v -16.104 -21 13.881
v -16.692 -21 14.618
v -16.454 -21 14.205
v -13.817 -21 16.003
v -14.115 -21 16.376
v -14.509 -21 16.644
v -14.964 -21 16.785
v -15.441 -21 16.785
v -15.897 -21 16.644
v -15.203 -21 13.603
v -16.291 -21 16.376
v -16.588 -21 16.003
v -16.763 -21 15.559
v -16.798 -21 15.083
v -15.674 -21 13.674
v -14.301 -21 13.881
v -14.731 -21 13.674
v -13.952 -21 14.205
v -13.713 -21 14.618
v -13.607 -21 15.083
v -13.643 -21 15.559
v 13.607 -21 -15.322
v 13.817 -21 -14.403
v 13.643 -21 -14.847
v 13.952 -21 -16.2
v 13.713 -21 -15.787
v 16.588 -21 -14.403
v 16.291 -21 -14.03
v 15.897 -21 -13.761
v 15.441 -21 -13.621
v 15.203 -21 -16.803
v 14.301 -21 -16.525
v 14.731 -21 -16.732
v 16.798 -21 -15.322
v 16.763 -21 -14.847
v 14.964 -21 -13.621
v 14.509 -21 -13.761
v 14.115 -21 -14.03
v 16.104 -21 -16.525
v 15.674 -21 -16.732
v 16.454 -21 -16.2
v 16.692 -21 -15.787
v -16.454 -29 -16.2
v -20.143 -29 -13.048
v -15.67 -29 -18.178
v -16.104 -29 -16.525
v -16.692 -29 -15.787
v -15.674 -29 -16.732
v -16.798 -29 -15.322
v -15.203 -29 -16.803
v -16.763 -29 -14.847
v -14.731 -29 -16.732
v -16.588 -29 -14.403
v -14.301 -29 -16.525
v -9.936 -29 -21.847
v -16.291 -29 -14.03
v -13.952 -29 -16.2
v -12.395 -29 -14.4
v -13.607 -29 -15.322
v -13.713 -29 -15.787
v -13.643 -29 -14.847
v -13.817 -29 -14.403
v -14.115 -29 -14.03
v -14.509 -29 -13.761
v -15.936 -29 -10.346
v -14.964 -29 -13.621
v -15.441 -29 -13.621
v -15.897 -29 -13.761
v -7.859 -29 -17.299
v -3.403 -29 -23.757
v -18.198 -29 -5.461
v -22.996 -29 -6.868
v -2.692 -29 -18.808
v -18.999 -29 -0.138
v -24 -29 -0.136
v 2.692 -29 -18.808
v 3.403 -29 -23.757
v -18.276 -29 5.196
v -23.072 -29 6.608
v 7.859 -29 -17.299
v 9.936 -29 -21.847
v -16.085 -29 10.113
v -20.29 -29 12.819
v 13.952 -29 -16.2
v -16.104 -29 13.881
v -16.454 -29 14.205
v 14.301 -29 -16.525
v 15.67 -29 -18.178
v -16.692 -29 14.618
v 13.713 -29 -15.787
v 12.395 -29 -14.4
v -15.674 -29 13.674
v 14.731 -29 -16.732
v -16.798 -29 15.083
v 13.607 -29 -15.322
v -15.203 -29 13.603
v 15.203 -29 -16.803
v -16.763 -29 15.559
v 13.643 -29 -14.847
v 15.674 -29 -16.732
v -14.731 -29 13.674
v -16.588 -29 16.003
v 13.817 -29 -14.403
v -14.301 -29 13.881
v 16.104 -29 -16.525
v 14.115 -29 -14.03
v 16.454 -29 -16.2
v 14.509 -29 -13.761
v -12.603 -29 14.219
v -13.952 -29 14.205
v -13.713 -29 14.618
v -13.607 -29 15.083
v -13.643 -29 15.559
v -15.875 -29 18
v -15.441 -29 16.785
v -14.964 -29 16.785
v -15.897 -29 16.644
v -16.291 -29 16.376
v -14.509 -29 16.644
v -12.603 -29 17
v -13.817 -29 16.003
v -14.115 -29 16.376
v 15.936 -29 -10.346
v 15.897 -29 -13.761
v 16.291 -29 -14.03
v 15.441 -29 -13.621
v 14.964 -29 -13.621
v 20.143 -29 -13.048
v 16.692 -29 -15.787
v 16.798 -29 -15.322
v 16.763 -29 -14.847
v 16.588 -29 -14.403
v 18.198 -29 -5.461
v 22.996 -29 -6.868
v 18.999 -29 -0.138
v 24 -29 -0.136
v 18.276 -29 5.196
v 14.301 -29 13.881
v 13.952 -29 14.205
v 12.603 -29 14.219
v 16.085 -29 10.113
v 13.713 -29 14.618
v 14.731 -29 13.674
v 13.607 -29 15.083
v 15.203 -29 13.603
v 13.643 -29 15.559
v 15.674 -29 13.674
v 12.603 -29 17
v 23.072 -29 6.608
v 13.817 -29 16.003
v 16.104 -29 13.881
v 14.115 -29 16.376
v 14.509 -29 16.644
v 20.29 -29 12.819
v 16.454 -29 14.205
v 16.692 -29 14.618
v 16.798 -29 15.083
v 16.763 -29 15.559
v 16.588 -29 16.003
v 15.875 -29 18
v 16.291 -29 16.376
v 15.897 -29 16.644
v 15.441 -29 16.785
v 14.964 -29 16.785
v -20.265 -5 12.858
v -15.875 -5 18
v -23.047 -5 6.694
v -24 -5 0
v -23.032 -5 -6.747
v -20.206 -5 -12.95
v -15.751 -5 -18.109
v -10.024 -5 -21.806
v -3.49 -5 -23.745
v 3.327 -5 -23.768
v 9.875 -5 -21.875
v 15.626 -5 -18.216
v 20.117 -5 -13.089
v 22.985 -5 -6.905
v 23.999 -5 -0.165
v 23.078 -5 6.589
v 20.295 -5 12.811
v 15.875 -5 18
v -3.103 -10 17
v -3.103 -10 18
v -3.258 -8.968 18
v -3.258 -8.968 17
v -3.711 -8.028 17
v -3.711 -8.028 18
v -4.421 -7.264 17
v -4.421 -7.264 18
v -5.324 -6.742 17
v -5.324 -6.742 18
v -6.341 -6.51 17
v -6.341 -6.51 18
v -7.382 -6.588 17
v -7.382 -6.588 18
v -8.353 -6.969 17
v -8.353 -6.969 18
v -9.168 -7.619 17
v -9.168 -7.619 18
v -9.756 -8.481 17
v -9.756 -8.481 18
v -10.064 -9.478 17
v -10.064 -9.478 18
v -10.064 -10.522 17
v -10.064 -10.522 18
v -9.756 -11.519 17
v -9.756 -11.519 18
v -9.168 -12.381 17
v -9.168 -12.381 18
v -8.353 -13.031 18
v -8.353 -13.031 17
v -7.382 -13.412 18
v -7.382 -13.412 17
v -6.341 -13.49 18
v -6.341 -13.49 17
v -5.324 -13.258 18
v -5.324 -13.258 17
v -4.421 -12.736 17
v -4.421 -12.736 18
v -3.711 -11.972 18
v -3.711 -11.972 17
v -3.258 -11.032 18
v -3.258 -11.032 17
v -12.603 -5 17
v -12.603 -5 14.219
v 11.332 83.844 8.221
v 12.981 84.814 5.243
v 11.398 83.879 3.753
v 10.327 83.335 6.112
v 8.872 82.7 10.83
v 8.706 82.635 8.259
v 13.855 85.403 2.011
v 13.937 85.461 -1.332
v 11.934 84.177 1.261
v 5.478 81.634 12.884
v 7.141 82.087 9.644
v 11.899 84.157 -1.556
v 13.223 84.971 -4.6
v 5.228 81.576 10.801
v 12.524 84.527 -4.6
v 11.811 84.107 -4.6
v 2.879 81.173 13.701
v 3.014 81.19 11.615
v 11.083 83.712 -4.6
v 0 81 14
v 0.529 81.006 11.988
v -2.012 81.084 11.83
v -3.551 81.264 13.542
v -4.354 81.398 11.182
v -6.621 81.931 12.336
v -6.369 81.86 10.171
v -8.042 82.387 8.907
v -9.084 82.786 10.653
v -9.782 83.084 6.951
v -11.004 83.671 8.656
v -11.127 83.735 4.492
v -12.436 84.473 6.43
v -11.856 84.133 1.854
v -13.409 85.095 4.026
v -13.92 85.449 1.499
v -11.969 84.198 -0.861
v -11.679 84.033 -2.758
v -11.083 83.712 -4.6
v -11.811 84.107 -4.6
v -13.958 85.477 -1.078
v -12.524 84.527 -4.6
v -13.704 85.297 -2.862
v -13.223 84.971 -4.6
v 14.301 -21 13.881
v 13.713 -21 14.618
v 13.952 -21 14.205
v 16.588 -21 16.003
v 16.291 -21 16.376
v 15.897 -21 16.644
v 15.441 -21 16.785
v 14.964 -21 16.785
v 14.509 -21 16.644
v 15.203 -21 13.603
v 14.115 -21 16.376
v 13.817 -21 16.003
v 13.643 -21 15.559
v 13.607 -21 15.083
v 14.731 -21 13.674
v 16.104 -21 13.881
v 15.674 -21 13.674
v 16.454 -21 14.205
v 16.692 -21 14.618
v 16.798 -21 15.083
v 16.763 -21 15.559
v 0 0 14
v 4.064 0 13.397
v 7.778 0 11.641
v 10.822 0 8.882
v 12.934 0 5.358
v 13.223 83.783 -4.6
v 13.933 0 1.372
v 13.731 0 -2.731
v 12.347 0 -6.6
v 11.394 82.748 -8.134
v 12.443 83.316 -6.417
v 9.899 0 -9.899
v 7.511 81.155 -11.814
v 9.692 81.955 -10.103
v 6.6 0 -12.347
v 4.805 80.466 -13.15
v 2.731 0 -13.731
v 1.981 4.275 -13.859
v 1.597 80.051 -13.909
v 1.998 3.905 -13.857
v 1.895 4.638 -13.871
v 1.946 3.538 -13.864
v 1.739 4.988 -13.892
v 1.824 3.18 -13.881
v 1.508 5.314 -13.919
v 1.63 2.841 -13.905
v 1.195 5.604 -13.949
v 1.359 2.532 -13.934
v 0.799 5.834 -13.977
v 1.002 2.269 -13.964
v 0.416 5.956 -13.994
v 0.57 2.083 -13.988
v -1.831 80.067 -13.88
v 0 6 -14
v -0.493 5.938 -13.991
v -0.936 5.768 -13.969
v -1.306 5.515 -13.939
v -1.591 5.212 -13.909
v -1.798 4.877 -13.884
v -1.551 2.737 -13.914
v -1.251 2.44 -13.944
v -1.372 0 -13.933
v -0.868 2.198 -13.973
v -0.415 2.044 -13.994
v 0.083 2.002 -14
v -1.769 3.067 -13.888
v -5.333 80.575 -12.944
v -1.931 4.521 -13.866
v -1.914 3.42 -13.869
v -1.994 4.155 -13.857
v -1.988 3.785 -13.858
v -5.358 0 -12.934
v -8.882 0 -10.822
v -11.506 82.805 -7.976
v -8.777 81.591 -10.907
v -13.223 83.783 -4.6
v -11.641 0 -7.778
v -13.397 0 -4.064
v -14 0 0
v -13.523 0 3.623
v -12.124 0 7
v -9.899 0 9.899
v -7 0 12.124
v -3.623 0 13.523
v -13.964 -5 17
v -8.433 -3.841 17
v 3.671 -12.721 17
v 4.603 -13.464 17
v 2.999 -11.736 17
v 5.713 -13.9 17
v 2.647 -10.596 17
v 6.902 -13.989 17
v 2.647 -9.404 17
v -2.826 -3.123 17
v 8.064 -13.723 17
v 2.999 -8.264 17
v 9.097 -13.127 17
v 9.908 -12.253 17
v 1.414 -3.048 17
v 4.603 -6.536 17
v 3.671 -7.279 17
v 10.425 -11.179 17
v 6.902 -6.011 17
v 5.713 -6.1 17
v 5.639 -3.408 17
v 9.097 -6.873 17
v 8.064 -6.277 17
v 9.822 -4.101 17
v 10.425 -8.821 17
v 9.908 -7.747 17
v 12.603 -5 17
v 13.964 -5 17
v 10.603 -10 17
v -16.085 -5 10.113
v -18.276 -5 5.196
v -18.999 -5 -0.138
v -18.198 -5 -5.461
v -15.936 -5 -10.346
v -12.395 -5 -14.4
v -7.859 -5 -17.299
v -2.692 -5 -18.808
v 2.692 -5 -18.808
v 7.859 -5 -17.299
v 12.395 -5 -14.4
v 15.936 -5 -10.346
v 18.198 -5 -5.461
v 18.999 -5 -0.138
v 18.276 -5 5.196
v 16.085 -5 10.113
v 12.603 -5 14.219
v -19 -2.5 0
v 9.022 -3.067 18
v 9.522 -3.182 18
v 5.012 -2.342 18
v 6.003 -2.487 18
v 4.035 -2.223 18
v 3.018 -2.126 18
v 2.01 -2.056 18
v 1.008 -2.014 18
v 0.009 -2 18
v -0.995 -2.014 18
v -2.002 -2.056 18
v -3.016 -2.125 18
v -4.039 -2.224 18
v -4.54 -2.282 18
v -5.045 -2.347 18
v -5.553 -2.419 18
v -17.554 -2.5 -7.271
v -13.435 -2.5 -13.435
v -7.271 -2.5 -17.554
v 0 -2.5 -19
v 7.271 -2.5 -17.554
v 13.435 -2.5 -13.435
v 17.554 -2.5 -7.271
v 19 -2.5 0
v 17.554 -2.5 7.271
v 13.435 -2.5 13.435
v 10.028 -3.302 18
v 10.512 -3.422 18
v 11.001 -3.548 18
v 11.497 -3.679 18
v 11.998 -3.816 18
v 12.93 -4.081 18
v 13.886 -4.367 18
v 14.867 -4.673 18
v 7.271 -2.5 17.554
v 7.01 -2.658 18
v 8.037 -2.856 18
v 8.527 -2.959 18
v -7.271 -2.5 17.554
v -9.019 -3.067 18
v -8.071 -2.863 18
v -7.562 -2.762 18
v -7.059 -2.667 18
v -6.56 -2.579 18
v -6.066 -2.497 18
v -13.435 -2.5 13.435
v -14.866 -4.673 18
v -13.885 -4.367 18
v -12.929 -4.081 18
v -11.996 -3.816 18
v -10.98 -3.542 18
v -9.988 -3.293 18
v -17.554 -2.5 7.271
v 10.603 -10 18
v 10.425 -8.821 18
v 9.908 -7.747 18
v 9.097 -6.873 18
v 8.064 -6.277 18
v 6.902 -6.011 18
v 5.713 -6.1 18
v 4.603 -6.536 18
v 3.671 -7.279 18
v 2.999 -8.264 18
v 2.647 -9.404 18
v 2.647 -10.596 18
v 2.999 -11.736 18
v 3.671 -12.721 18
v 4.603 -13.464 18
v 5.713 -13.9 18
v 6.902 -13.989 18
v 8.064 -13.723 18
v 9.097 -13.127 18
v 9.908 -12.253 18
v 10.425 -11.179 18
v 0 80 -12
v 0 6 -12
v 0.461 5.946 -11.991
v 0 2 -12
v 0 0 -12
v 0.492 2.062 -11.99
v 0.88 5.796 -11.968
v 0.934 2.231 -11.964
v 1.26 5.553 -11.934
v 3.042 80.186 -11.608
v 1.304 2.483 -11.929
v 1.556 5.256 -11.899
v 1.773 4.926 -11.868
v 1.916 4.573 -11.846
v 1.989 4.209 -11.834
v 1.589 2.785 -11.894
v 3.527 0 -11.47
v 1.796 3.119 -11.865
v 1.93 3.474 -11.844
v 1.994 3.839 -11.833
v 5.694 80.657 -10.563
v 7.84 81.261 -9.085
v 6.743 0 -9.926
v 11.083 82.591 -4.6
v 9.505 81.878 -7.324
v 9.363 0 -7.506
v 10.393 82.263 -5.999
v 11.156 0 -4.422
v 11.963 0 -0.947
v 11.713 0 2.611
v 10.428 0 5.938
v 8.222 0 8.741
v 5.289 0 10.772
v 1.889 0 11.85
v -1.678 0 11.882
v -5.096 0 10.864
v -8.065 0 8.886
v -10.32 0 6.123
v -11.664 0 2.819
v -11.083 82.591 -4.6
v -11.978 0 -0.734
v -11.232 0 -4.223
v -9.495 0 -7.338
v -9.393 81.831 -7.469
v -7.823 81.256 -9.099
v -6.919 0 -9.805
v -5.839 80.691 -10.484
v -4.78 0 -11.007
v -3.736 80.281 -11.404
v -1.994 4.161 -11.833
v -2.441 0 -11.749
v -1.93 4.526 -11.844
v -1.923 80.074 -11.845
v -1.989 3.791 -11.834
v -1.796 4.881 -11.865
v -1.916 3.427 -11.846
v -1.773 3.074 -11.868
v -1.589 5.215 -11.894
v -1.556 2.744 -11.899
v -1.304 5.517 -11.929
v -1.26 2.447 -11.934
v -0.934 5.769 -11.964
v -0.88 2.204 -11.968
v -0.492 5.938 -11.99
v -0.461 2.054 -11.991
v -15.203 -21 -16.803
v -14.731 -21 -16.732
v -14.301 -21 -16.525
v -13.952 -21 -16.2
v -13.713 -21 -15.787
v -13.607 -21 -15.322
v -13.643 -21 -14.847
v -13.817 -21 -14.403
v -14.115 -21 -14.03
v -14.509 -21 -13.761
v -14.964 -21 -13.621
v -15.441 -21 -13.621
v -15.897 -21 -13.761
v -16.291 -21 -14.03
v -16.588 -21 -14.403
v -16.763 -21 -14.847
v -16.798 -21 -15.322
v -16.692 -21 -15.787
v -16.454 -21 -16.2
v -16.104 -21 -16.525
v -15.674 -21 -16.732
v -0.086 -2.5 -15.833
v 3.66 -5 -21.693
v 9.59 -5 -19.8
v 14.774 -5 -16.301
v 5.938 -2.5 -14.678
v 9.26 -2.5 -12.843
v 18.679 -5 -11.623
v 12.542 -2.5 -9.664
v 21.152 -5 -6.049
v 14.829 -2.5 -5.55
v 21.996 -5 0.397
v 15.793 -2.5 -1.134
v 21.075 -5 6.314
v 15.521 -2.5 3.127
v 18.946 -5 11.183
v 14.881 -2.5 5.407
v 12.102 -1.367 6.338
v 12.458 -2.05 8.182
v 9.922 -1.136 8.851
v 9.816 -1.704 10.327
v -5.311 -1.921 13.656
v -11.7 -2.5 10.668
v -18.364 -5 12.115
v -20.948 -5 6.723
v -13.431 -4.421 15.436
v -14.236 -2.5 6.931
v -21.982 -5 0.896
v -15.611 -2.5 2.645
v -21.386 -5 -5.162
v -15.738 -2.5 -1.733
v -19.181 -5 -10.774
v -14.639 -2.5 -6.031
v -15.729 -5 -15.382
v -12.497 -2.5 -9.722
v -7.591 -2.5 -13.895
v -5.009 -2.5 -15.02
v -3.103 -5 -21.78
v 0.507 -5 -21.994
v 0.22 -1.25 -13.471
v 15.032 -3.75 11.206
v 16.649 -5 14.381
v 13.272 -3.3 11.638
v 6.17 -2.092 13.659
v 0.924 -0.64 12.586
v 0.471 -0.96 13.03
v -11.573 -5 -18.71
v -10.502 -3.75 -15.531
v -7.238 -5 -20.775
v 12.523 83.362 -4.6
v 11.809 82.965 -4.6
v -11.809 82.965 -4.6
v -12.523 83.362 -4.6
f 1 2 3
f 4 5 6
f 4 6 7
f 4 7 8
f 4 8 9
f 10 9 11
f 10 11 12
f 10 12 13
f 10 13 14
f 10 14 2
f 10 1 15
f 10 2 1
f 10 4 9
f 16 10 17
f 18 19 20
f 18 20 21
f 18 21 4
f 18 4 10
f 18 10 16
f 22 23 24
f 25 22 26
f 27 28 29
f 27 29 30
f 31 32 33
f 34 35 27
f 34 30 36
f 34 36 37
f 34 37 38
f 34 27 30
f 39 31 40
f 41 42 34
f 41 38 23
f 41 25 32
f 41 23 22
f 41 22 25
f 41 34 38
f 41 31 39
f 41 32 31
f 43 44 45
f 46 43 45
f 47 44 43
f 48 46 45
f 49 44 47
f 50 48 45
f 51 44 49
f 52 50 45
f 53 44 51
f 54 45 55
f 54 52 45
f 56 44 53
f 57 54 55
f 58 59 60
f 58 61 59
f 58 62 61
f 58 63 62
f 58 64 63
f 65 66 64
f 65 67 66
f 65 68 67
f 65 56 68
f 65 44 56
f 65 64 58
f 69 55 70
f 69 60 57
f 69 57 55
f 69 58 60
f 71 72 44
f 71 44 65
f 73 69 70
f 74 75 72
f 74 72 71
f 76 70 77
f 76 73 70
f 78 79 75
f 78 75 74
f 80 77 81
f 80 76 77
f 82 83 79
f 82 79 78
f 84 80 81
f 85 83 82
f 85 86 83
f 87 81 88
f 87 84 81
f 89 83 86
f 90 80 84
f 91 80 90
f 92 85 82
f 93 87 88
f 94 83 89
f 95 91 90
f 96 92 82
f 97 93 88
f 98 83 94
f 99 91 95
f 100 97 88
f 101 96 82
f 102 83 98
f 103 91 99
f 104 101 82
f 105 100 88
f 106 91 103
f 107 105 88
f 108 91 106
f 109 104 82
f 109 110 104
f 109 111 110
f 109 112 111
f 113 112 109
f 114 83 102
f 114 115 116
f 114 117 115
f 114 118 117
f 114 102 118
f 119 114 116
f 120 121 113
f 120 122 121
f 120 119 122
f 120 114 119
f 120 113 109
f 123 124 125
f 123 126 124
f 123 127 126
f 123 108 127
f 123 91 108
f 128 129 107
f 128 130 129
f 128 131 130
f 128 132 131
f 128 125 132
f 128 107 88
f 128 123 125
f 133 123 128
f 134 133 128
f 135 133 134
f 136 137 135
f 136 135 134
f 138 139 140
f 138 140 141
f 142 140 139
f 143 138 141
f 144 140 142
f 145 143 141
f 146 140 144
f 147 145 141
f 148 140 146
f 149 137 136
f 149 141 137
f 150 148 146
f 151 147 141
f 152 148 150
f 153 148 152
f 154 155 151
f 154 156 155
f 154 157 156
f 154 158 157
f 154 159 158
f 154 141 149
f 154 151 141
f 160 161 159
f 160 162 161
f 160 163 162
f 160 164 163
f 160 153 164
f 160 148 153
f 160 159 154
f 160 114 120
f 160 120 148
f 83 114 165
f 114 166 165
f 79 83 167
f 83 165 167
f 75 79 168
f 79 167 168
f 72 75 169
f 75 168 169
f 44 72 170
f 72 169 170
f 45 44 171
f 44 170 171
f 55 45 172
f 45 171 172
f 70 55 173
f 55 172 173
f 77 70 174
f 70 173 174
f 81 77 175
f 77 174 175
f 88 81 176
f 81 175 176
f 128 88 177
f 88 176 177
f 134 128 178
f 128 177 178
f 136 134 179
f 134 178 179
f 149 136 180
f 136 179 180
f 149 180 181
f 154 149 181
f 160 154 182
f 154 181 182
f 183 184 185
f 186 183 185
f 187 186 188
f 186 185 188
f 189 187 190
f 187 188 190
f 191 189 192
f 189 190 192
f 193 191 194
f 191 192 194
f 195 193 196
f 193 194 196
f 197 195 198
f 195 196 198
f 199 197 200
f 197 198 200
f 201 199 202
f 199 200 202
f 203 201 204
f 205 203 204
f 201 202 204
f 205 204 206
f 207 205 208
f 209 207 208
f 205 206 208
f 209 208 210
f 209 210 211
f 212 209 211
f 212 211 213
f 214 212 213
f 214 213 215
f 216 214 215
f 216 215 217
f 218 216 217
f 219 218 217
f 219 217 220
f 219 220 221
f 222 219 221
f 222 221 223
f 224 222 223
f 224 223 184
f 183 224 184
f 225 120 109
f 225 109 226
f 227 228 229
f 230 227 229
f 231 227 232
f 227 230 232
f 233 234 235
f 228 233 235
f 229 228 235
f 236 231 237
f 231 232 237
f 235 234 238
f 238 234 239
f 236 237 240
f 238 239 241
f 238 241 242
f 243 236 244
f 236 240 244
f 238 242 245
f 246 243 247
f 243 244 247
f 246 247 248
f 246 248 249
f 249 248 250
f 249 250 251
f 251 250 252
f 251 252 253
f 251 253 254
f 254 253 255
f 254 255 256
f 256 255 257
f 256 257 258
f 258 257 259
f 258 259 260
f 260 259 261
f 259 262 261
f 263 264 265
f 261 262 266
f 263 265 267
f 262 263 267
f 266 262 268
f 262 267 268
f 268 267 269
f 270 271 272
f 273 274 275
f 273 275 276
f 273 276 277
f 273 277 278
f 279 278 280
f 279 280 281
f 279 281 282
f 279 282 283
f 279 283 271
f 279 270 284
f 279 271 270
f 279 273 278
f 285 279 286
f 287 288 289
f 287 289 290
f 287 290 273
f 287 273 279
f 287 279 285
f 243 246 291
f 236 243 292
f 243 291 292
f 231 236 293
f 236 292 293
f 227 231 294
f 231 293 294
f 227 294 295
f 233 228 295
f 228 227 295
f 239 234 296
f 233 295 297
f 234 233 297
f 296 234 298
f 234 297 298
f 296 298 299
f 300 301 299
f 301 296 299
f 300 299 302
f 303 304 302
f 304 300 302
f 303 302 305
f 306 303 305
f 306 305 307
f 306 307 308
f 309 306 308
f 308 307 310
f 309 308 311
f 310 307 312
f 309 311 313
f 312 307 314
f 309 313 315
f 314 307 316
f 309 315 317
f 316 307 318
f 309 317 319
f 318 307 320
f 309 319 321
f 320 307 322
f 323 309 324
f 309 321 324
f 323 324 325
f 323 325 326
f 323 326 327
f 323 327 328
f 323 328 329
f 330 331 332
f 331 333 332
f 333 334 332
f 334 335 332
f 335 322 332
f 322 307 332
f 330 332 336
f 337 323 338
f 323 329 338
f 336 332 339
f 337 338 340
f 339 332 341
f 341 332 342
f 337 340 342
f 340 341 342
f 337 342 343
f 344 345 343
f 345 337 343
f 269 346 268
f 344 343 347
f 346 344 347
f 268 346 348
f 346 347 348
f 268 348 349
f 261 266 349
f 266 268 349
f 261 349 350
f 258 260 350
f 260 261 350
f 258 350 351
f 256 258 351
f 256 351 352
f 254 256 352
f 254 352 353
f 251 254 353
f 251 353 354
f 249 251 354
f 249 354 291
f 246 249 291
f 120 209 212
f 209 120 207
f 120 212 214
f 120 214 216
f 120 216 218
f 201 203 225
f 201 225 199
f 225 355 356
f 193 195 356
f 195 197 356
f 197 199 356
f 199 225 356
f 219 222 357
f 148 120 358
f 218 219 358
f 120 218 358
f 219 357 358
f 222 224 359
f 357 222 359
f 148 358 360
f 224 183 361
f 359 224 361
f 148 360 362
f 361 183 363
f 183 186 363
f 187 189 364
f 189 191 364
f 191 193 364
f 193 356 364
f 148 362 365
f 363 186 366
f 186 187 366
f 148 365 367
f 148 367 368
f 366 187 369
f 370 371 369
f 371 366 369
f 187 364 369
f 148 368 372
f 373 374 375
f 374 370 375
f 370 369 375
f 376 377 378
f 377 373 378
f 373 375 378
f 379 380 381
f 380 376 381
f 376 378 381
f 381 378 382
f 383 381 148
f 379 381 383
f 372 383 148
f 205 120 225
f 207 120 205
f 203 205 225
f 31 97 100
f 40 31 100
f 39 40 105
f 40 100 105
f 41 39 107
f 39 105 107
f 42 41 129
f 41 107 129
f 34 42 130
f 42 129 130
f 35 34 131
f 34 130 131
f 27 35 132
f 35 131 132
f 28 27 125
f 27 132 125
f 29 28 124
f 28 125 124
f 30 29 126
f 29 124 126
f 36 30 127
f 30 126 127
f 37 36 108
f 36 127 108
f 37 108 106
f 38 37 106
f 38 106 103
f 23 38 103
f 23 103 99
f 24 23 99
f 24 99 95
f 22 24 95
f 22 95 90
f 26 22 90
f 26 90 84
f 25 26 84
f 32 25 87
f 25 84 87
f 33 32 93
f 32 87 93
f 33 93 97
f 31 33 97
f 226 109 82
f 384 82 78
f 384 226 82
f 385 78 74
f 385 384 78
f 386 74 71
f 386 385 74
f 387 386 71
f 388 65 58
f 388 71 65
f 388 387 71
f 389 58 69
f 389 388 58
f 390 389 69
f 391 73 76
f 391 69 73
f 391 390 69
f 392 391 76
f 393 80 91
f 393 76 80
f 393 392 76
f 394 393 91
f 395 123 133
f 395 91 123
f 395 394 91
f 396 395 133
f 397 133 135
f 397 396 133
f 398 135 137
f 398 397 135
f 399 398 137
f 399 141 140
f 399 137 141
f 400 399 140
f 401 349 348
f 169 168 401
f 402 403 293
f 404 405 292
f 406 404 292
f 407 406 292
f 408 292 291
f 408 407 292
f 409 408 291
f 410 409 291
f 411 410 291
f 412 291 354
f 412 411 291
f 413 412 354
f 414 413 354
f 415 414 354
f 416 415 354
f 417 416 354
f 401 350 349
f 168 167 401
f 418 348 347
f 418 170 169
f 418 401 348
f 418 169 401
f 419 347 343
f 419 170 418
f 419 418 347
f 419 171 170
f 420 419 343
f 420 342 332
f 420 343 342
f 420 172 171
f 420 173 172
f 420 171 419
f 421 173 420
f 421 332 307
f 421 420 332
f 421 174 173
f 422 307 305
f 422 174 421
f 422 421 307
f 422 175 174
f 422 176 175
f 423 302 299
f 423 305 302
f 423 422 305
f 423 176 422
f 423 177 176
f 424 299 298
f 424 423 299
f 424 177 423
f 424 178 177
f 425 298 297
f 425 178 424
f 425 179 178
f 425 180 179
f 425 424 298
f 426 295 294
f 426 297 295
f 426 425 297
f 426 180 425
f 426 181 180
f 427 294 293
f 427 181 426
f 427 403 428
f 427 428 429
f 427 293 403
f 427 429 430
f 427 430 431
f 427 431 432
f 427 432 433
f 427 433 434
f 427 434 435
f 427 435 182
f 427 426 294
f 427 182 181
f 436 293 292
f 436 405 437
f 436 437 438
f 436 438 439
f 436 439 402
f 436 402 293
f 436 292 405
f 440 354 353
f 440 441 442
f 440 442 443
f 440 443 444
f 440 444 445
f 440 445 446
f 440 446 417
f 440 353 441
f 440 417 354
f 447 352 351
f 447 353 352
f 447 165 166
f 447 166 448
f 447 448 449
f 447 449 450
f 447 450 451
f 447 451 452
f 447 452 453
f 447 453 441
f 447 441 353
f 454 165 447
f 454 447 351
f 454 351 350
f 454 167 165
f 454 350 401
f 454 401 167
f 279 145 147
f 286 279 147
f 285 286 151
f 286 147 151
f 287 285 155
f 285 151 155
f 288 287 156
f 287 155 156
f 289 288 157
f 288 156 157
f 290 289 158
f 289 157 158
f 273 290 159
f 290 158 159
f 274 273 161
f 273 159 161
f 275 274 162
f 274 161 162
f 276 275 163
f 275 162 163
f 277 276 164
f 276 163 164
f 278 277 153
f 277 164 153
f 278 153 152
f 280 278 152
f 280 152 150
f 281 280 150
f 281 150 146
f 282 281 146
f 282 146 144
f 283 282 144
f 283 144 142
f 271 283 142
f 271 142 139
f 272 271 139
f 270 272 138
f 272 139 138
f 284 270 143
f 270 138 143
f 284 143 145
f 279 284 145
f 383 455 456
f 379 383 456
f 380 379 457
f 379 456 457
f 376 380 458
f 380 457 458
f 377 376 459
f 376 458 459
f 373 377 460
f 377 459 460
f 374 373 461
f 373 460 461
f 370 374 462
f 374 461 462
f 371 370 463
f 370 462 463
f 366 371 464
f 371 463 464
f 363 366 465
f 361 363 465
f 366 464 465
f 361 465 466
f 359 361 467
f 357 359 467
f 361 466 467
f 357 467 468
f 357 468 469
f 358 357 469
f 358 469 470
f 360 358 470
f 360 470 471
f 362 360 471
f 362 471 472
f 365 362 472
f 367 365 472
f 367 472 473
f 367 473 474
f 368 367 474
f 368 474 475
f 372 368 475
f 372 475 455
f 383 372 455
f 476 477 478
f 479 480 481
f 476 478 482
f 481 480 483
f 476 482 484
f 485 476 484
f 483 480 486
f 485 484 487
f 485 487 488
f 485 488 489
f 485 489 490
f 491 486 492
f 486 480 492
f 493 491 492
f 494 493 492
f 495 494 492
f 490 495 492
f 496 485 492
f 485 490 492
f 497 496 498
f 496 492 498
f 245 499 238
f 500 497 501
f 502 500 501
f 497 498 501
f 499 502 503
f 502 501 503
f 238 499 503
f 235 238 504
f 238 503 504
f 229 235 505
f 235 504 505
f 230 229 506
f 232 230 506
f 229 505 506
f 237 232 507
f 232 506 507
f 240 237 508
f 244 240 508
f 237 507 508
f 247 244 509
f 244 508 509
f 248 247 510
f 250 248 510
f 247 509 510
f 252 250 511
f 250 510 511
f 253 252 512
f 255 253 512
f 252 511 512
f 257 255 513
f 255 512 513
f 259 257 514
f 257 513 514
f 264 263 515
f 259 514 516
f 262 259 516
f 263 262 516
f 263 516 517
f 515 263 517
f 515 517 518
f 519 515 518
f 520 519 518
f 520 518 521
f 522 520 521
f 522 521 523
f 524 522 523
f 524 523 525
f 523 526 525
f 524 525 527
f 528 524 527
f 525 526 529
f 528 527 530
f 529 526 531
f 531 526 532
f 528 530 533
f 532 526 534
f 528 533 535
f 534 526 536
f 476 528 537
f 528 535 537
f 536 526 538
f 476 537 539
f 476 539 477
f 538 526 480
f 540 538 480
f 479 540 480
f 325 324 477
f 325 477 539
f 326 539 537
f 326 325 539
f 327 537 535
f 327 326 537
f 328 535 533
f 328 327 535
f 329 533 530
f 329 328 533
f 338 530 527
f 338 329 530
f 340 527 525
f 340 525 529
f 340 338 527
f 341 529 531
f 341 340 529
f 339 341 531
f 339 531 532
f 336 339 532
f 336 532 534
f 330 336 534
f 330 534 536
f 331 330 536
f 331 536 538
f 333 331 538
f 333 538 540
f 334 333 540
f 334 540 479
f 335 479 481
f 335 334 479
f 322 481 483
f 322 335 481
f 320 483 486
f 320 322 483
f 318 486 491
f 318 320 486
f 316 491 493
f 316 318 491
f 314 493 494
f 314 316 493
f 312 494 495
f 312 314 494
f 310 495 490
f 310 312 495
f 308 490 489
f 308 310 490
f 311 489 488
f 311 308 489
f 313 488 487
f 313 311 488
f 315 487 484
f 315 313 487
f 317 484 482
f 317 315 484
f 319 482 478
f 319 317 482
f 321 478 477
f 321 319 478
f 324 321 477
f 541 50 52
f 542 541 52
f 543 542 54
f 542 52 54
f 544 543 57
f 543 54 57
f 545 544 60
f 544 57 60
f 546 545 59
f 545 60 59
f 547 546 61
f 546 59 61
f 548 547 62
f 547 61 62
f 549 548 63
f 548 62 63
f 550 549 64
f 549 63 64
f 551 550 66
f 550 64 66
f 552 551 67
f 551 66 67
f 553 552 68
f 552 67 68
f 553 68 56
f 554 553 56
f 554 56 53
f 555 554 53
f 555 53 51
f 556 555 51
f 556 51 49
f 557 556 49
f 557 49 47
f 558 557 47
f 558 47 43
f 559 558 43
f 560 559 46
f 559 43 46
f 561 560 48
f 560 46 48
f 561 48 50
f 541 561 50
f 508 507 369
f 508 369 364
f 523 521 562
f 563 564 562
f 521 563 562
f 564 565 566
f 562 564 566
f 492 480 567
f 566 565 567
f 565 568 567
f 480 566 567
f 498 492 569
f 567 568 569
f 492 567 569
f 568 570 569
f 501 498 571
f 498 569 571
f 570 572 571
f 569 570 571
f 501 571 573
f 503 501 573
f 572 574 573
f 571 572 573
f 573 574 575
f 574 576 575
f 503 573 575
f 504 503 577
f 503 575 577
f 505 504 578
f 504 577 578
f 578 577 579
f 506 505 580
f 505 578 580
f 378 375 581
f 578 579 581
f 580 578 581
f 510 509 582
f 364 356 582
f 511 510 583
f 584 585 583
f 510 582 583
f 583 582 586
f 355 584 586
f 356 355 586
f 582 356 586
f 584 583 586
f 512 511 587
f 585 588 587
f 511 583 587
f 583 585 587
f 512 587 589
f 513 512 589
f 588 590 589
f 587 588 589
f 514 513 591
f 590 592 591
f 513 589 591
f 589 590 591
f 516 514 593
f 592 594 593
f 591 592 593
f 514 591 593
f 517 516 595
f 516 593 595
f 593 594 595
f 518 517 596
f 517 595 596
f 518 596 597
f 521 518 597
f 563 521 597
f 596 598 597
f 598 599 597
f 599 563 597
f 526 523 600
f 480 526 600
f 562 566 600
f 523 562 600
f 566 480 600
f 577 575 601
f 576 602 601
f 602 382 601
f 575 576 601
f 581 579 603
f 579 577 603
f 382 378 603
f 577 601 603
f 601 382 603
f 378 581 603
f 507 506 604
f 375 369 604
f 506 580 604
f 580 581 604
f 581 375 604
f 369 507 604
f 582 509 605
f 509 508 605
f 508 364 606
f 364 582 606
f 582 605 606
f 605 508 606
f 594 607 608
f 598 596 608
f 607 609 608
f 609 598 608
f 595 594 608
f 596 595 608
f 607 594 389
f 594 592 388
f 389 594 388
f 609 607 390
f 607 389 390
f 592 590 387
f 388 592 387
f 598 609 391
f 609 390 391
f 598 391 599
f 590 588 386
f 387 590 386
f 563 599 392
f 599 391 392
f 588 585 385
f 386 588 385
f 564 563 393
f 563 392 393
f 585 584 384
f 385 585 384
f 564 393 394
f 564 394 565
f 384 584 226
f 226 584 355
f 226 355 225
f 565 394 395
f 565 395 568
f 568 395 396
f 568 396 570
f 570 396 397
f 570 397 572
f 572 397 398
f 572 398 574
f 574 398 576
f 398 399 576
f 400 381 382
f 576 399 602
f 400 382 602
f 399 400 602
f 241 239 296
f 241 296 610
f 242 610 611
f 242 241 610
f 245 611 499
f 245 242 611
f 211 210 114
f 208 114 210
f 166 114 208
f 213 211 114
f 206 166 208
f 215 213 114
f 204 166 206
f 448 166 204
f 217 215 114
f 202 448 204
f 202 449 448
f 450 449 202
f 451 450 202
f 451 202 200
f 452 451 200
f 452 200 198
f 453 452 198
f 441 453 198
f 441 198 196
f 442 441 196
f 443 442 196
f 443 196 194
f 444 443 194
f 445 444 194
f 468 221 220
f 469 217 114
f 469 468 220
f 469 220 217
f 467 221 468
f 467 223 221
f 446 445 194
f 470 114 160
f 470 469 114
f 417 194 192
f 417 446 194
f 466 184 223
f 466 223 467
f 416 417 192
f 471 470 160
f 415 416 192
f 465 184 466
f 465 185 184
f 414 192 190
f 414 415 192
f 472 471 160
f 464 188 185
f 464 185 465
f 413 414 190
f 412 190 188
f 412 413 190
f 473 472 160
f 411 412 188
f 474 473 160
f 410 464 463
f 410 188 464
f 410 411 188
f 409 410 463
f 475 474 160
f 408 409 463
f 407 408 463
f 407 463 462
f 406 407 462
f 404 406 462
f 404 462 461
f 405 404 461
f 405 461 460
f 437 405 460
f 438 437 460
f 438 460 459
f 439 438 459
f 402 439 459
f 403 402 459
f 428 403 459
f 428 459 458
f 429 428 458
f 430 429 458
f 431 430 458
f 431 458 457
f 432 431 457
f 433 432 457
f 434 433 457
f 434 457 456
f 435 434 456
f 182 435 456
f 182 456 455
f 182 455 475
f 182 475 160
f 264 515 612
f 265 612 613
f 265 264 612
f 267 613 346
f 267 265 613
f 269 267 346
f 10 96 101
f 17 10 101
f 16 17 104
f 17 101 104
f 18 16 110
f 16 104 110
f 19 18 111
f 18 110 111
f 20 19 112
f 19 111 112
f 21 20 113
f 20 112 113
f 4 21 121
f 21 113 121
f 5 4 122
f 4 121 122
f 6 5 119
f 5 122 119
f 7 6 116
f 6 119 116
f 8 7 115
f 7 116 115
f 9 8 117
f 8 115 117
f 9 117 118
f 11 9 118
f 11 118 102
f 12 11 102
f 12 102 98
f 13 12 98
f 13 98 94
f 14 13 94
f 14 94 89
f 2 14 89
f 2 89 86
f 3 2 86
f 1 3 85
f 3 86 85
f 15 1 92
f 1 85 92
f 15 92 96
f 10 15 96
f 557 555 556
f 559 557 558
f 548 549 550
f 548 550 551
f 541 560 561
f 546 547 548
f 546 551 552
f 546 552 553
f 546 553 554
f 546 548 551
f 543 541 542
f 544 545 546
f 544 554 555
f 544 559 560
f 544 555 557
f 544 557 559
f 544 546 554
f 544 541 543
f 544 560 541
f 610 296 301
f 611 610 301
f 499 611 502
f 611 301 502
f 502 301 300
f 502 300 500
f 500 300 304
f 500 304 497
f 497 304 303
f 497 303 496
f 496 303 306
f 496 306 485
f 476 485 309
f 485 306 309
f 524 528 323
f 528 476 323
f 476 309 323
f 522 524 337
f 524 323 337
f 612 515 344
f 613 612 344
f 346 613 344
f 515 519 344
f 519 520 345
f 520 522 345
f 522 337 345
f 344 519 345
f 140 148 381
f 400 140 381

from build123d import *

# Parameters (mm, degrees)
SKETCH1_R               = 14
BOSS_EXTRUDE1_DEPTH     = 105
SKETCH2_R               = 24
CUT_EXTRUDE1_DEPTH      = 110.567330897
SKETCH4_R               = 25
CUT_EXTRUDE2_DEPTH      = 9.4
SKETCH5_R               = 12
CUT_EXTRUDE3_DEPTH      = 123
SKETCH10_R              = 14
SKETCH8_R               = 24
SKETCH12_R              = 24
SKETCH12_R_2            = 19
BOSS_EXTRUDE2_DEPTH     = 24
SKETCH13_R              = 1.6
CUT_EXTRUDE4_DEPTH      = 8
CUT_EXTRUDE6_DEPTH      = 6
BOSS_EXTRUDE7_DEPTH     = 1
CUT_EXTRUDE7_OUTLINE_W  = 25.205591592
CUT_EXTRUDE7_OUTLINE_H  = 24
CUT_EXTRUDE7_DEPTH      = 2.781366517
SKETCH20_R              = 4
SKETCH20_R_2            = 3.5
CUT_EXTRUDE8_DEPTH      = 10
SKETCH22_R              = 1.05
BOSS_EXTRUDE8_DEPTH     = 1
CUT_EXTRUDE9_DEPTH      = 10
CUT_EXTRUDE9_DEPTH_BACK = 5
SKETCH23_R              = 2


with BuildPart() as part:
    # Sketch1 → Boss-Extrude1 (new body)
    with BuildSketch(Plane(origin=(0, 0, 0), x_dir=(1, 0, 0), z_dir=(0, 1, 0))):
        with Locations(Location((0, 0, 0), (0, 0, 270))):
            Circle(SKETCH1_R)
    extrude(amount=BOSS_EXTRUDE1_DEPTH)

    # Sketch2 → Cut-Extrude1 (cut, through all)
    with BuildSketch(Plane(origin=(0, 0, -14), x_dir=(-1, 0, 0), z_dir=(0, 0, -1))):
        with Locations((0, 105)):
            Circle(SKETCH2_R)
    extrude(amount=-CUT_EXTRUDE1_DEPTH, mode=Mode.SUBTRACT)

    # Sketch4 → Cut-Extrude2 (cut)
    with BuildSketch(Plane(origin=(0, 0, -14), x_dir=(-1, 0, 0), z_dir=(0, 0, -1))):
        with Locations((0, 105)):
            Circle(SKETCH4_R)
    extrude(amount=-CUT_EXTRUDE2_DEPTH, mode=Mode.SUBTRACT)

    # Sketch5 → Cut-Extrude3 (cut)
    with BuildSketch(Plane.XZ):
        with Locations(Location((0, 0, 0), (0, 0, 270))):
            Circle(SKETCH5_R)
    extrude(amount=-CUT_EXTRUDE3_DEPTH, mode=Mode.SUBTRACT)

    # Sketch10 → Loft6 section 0
    with BuildSketch(Plane(origin=(0, 0, 0), x_dir=(-1, 0, 0), z_dir=(0, -1, 0))):
        Circle(SKETCH10_R)
    # Sketch8 → Loft6 section 1
    with BuildSketch(Plane(origin=(0, -5, 0), x_dir=(-1, 0, 0), z_dir=(0, -1, 0))):
        Circle(SKETCH8_R)
    loft()

    # Cut-Loft1: read off the stored shape, not the designer's step
    # Cut-Loft1: loft between two sections, ruled curve by curve
    cut_loft1_from = [
        Edge.make_bspline([(-6.918556866, 0, -9.804772863), (12.69098886, 0, -23.641886595), (26.528102592, 0, -4.032340869), (6.918556866, 0, 9.804772863), (-12.69098886, 0, 23.641886595), (-26.528102592, 0, 4.032340869), (-6.918556866, 0, -9.804772863)], [0, 0, 0, 0, 0.5, 0.5, 0.5, 1, 1, 1, 1], 3, [1, 0.333333333, 0.333333333, 1, 0.333333333, 0.333333333, 1]),
    ]
    cut_loft1_to = [
        Edge.make_bspline([(3.659825819, -5, -21.693447743), (47.046721305, -5, -14.373796105), (39.727069667, -5, 29.013099381), (-3.659825819, -5, 21.693447743), (-47.046721305, -5, 14.373796105), (-39.727069667, -5, -29.013099381), (3.659825819, -5, -21.693447743)], [0, 0, 0, 0, 0.5, 0.5, 0.5, 1, 1, 1, 1], 3, [1, 0.333333333, 0.333333333, 1, 0.333333333, 0.333333333, 1]),
    ]
    cut_loft1 = Solid(Shell([*[Face.make_surface_from_curves(cut_loft1_from[k], cut_loft1_to[k]) for k in range(1)], Face(Wire(cut_loft1_from)), Face(Wire(cut_loft1_to))]))
    add(cut_loft1, mode=Mode.SUBTRACT)

    # Sketch12 → Boss-Extrude2 (add)
    with BuildSketch(Plane.XZ.offset(5)):
        Circle(SKETCH12_R)
        Circle(SKETCH12_R_2, mode=Mode.SUBTRACT)
    extrude(amount=BOSS_EXTRUDE2_DEPTH)

    # Sketch13 → Cut-Extrude4 (cut)
    with BuildSketch(Plane.XZ.offset(29)):
        with Locations(Location((-15.202795796, 15.202795796, 0), (0, 0, 270))):
            Circle(SKETCH13_R)
        with Locations(Location((15.202795796, 15.202795796, 0), (0, 0, 270))):
            Circle(SKETCH13_R)
        with Locations(Location((15.202795796, -15.202795796, 0), (0, 0, 270))):
            Circle(SKETCH13_R)
        with Locations(Location((-15.202795796, -15.202795796, 0), (0, 0, 270))):
            Circle(SKETCH13_R)
    extrude(amount=-CUT_EXTRUDE4_DEPTH, mode=Mode.SUBTRACT)

    # Sketch15 → Cut-Extrude6 (cut)
    with BuildSketch(Plane.XY.offset(24)):
        Polygon((-24, -5), (-24, -29), (24, -29), (24, -5), (14, 0), (-14, 0), align=None)
    extrude(amount=-CUT_EXTRUDE6_DEPTH, mode=Mode.SUBTRACT)

    # Sketch17 → Boss-Extrude7 (add)
    with BuildSketch(Plane.XY.offset(18)):
        with BuildLine():
            Line((15.874507866, -29), (15.874507866, -5))
            add(Edge.make_bspline(
                [(-15.874507866, -5), (-14.594943965, -4.576824016), (-12.019648156, -3.781972699), (-9.397994136, -3.134788187), (-7.407221822, -2.727541998), (-6.739521939, -2.6048822), (-5.394539357, -2.390087157), (-4.71546375, -2.297841059), (-2.684830415, -2.075564646), (-1.33504572, -1.999607533), (1.356128498, -2.000395553), (2.697521645, -2.07707476), (5.372653744, -2.369657545), (6.706415867, -2.585139688), (8.702458542, -2.992042885), (9.36832807, -3.141896909), (10.69006115, -3.463557333), (11.346413002, -3.635391758), (13.304203001, -4.178353981), (14.594485661, -4.576672447), (15.874507866, -5)],
                knots=[0, 0, 0, 0, 0.125, 0.25, 0.25, 0.3125, 0.3125, 0.375, 0.375, 0.5, 0.5, 0.625, 0.625, 0.75, 0.75, 0.8125, 0.8125, 0.875, 0.875, 1, 1, 1, 1], degree=3))
            Line((-15.874507866, -5), (-15.874507866, -29))
            Line((-15.874507866, -29), (15.874507866, -29))
        make_face()
    extrude(amount=-BOSS_EXTRUDE7_DEPTH)

    # Cut-Extrude7: read off the stored shape, not the designer's step
    # Cut-Extrude7 outline → Cut-Extrude7 (cut)
    with BuildSketch(Plane(origin=(0, 0, 17), x_dir=(-1, 0, 0), z_dir=(0, 0, -1))):
        with Locations((0, -17)):
            Rectangle(CUT_EXTRUDE7_OUTLINE_W, CUT_EXTRUDE7_OUTLINE_H)
    extrude(amount=CUT_EXTRUDE7_DEPTH, mode=Mode.SUBTRACT)

    # Sketch20 → Cut-Extrude8 (cut)
    with BuildSketch(Plane.XY.offset(18)):
        with Locations((6.602795796, -10)):
            Circle(SKETCH20_R)
        with Locations((-6.602795796, -10)):
            Circle(SKETCH20_R_2)
    extrude(amount=-CUT_EXTRUDE8_DEPTH, mode=Mode.SUBTRACT)

    # Sketch23 → Cut-Extrude9 (cut, two sides: drawn at the far end of the back side and taken through both)
    with BuildSketch(Plane.XY.offset(-12).offset(-CUT_EXTRUDE9_DEPTH_BACK)):
        with Locations(Location((0, 4, 0), (0, 0, 90))):
            Circle(SKETCH23_R)
    extrude(amount=CUT_EXTRUDE9_DEPTH + CUT_EXTRUDE9_DEPTH_BACK, mode=Mode.SUBTRACT)


with BuildPart() as body_2:
    # Sketch22 → Boss-Extrude8 (new body)
    with BuildSketch(Plane.XZ.offset(29)):
        with BuildLine():
            Line((-15.874507866, 18), (15.874507866, 18))
            ThreePointArc((15.874507866, 18), (0, -24), (-15.874507866, 18))
        make_face()
        with Locations(Location((-15.202795796, 15.202795796, 0), (0, 0, 270))):
            Circle(SKETCH22_R, mode=Mode.SUBTRACT)
        with Locations(Location((15.202795796, 15.202795796, 0), (0, 0, 270))):
            Circle(SKETCH22_R, mode=Mode.SUBTRACT)
        with Locations(Location((15.202795796, -15.202795796, 0), (0, 0, 270))):
            Circle(SKETCH22_R, mode=Mode.SUBTRACT)
        with Locations(Location((-15.202795796, -15.202795796, 0), (0, 0, 270))):
            Circle(SKETCH22_R, mode=Mode.SUBTRACT)
    extrude(amount=BOSS_EXTRUDE8_DEPTH)


solid = part.part
